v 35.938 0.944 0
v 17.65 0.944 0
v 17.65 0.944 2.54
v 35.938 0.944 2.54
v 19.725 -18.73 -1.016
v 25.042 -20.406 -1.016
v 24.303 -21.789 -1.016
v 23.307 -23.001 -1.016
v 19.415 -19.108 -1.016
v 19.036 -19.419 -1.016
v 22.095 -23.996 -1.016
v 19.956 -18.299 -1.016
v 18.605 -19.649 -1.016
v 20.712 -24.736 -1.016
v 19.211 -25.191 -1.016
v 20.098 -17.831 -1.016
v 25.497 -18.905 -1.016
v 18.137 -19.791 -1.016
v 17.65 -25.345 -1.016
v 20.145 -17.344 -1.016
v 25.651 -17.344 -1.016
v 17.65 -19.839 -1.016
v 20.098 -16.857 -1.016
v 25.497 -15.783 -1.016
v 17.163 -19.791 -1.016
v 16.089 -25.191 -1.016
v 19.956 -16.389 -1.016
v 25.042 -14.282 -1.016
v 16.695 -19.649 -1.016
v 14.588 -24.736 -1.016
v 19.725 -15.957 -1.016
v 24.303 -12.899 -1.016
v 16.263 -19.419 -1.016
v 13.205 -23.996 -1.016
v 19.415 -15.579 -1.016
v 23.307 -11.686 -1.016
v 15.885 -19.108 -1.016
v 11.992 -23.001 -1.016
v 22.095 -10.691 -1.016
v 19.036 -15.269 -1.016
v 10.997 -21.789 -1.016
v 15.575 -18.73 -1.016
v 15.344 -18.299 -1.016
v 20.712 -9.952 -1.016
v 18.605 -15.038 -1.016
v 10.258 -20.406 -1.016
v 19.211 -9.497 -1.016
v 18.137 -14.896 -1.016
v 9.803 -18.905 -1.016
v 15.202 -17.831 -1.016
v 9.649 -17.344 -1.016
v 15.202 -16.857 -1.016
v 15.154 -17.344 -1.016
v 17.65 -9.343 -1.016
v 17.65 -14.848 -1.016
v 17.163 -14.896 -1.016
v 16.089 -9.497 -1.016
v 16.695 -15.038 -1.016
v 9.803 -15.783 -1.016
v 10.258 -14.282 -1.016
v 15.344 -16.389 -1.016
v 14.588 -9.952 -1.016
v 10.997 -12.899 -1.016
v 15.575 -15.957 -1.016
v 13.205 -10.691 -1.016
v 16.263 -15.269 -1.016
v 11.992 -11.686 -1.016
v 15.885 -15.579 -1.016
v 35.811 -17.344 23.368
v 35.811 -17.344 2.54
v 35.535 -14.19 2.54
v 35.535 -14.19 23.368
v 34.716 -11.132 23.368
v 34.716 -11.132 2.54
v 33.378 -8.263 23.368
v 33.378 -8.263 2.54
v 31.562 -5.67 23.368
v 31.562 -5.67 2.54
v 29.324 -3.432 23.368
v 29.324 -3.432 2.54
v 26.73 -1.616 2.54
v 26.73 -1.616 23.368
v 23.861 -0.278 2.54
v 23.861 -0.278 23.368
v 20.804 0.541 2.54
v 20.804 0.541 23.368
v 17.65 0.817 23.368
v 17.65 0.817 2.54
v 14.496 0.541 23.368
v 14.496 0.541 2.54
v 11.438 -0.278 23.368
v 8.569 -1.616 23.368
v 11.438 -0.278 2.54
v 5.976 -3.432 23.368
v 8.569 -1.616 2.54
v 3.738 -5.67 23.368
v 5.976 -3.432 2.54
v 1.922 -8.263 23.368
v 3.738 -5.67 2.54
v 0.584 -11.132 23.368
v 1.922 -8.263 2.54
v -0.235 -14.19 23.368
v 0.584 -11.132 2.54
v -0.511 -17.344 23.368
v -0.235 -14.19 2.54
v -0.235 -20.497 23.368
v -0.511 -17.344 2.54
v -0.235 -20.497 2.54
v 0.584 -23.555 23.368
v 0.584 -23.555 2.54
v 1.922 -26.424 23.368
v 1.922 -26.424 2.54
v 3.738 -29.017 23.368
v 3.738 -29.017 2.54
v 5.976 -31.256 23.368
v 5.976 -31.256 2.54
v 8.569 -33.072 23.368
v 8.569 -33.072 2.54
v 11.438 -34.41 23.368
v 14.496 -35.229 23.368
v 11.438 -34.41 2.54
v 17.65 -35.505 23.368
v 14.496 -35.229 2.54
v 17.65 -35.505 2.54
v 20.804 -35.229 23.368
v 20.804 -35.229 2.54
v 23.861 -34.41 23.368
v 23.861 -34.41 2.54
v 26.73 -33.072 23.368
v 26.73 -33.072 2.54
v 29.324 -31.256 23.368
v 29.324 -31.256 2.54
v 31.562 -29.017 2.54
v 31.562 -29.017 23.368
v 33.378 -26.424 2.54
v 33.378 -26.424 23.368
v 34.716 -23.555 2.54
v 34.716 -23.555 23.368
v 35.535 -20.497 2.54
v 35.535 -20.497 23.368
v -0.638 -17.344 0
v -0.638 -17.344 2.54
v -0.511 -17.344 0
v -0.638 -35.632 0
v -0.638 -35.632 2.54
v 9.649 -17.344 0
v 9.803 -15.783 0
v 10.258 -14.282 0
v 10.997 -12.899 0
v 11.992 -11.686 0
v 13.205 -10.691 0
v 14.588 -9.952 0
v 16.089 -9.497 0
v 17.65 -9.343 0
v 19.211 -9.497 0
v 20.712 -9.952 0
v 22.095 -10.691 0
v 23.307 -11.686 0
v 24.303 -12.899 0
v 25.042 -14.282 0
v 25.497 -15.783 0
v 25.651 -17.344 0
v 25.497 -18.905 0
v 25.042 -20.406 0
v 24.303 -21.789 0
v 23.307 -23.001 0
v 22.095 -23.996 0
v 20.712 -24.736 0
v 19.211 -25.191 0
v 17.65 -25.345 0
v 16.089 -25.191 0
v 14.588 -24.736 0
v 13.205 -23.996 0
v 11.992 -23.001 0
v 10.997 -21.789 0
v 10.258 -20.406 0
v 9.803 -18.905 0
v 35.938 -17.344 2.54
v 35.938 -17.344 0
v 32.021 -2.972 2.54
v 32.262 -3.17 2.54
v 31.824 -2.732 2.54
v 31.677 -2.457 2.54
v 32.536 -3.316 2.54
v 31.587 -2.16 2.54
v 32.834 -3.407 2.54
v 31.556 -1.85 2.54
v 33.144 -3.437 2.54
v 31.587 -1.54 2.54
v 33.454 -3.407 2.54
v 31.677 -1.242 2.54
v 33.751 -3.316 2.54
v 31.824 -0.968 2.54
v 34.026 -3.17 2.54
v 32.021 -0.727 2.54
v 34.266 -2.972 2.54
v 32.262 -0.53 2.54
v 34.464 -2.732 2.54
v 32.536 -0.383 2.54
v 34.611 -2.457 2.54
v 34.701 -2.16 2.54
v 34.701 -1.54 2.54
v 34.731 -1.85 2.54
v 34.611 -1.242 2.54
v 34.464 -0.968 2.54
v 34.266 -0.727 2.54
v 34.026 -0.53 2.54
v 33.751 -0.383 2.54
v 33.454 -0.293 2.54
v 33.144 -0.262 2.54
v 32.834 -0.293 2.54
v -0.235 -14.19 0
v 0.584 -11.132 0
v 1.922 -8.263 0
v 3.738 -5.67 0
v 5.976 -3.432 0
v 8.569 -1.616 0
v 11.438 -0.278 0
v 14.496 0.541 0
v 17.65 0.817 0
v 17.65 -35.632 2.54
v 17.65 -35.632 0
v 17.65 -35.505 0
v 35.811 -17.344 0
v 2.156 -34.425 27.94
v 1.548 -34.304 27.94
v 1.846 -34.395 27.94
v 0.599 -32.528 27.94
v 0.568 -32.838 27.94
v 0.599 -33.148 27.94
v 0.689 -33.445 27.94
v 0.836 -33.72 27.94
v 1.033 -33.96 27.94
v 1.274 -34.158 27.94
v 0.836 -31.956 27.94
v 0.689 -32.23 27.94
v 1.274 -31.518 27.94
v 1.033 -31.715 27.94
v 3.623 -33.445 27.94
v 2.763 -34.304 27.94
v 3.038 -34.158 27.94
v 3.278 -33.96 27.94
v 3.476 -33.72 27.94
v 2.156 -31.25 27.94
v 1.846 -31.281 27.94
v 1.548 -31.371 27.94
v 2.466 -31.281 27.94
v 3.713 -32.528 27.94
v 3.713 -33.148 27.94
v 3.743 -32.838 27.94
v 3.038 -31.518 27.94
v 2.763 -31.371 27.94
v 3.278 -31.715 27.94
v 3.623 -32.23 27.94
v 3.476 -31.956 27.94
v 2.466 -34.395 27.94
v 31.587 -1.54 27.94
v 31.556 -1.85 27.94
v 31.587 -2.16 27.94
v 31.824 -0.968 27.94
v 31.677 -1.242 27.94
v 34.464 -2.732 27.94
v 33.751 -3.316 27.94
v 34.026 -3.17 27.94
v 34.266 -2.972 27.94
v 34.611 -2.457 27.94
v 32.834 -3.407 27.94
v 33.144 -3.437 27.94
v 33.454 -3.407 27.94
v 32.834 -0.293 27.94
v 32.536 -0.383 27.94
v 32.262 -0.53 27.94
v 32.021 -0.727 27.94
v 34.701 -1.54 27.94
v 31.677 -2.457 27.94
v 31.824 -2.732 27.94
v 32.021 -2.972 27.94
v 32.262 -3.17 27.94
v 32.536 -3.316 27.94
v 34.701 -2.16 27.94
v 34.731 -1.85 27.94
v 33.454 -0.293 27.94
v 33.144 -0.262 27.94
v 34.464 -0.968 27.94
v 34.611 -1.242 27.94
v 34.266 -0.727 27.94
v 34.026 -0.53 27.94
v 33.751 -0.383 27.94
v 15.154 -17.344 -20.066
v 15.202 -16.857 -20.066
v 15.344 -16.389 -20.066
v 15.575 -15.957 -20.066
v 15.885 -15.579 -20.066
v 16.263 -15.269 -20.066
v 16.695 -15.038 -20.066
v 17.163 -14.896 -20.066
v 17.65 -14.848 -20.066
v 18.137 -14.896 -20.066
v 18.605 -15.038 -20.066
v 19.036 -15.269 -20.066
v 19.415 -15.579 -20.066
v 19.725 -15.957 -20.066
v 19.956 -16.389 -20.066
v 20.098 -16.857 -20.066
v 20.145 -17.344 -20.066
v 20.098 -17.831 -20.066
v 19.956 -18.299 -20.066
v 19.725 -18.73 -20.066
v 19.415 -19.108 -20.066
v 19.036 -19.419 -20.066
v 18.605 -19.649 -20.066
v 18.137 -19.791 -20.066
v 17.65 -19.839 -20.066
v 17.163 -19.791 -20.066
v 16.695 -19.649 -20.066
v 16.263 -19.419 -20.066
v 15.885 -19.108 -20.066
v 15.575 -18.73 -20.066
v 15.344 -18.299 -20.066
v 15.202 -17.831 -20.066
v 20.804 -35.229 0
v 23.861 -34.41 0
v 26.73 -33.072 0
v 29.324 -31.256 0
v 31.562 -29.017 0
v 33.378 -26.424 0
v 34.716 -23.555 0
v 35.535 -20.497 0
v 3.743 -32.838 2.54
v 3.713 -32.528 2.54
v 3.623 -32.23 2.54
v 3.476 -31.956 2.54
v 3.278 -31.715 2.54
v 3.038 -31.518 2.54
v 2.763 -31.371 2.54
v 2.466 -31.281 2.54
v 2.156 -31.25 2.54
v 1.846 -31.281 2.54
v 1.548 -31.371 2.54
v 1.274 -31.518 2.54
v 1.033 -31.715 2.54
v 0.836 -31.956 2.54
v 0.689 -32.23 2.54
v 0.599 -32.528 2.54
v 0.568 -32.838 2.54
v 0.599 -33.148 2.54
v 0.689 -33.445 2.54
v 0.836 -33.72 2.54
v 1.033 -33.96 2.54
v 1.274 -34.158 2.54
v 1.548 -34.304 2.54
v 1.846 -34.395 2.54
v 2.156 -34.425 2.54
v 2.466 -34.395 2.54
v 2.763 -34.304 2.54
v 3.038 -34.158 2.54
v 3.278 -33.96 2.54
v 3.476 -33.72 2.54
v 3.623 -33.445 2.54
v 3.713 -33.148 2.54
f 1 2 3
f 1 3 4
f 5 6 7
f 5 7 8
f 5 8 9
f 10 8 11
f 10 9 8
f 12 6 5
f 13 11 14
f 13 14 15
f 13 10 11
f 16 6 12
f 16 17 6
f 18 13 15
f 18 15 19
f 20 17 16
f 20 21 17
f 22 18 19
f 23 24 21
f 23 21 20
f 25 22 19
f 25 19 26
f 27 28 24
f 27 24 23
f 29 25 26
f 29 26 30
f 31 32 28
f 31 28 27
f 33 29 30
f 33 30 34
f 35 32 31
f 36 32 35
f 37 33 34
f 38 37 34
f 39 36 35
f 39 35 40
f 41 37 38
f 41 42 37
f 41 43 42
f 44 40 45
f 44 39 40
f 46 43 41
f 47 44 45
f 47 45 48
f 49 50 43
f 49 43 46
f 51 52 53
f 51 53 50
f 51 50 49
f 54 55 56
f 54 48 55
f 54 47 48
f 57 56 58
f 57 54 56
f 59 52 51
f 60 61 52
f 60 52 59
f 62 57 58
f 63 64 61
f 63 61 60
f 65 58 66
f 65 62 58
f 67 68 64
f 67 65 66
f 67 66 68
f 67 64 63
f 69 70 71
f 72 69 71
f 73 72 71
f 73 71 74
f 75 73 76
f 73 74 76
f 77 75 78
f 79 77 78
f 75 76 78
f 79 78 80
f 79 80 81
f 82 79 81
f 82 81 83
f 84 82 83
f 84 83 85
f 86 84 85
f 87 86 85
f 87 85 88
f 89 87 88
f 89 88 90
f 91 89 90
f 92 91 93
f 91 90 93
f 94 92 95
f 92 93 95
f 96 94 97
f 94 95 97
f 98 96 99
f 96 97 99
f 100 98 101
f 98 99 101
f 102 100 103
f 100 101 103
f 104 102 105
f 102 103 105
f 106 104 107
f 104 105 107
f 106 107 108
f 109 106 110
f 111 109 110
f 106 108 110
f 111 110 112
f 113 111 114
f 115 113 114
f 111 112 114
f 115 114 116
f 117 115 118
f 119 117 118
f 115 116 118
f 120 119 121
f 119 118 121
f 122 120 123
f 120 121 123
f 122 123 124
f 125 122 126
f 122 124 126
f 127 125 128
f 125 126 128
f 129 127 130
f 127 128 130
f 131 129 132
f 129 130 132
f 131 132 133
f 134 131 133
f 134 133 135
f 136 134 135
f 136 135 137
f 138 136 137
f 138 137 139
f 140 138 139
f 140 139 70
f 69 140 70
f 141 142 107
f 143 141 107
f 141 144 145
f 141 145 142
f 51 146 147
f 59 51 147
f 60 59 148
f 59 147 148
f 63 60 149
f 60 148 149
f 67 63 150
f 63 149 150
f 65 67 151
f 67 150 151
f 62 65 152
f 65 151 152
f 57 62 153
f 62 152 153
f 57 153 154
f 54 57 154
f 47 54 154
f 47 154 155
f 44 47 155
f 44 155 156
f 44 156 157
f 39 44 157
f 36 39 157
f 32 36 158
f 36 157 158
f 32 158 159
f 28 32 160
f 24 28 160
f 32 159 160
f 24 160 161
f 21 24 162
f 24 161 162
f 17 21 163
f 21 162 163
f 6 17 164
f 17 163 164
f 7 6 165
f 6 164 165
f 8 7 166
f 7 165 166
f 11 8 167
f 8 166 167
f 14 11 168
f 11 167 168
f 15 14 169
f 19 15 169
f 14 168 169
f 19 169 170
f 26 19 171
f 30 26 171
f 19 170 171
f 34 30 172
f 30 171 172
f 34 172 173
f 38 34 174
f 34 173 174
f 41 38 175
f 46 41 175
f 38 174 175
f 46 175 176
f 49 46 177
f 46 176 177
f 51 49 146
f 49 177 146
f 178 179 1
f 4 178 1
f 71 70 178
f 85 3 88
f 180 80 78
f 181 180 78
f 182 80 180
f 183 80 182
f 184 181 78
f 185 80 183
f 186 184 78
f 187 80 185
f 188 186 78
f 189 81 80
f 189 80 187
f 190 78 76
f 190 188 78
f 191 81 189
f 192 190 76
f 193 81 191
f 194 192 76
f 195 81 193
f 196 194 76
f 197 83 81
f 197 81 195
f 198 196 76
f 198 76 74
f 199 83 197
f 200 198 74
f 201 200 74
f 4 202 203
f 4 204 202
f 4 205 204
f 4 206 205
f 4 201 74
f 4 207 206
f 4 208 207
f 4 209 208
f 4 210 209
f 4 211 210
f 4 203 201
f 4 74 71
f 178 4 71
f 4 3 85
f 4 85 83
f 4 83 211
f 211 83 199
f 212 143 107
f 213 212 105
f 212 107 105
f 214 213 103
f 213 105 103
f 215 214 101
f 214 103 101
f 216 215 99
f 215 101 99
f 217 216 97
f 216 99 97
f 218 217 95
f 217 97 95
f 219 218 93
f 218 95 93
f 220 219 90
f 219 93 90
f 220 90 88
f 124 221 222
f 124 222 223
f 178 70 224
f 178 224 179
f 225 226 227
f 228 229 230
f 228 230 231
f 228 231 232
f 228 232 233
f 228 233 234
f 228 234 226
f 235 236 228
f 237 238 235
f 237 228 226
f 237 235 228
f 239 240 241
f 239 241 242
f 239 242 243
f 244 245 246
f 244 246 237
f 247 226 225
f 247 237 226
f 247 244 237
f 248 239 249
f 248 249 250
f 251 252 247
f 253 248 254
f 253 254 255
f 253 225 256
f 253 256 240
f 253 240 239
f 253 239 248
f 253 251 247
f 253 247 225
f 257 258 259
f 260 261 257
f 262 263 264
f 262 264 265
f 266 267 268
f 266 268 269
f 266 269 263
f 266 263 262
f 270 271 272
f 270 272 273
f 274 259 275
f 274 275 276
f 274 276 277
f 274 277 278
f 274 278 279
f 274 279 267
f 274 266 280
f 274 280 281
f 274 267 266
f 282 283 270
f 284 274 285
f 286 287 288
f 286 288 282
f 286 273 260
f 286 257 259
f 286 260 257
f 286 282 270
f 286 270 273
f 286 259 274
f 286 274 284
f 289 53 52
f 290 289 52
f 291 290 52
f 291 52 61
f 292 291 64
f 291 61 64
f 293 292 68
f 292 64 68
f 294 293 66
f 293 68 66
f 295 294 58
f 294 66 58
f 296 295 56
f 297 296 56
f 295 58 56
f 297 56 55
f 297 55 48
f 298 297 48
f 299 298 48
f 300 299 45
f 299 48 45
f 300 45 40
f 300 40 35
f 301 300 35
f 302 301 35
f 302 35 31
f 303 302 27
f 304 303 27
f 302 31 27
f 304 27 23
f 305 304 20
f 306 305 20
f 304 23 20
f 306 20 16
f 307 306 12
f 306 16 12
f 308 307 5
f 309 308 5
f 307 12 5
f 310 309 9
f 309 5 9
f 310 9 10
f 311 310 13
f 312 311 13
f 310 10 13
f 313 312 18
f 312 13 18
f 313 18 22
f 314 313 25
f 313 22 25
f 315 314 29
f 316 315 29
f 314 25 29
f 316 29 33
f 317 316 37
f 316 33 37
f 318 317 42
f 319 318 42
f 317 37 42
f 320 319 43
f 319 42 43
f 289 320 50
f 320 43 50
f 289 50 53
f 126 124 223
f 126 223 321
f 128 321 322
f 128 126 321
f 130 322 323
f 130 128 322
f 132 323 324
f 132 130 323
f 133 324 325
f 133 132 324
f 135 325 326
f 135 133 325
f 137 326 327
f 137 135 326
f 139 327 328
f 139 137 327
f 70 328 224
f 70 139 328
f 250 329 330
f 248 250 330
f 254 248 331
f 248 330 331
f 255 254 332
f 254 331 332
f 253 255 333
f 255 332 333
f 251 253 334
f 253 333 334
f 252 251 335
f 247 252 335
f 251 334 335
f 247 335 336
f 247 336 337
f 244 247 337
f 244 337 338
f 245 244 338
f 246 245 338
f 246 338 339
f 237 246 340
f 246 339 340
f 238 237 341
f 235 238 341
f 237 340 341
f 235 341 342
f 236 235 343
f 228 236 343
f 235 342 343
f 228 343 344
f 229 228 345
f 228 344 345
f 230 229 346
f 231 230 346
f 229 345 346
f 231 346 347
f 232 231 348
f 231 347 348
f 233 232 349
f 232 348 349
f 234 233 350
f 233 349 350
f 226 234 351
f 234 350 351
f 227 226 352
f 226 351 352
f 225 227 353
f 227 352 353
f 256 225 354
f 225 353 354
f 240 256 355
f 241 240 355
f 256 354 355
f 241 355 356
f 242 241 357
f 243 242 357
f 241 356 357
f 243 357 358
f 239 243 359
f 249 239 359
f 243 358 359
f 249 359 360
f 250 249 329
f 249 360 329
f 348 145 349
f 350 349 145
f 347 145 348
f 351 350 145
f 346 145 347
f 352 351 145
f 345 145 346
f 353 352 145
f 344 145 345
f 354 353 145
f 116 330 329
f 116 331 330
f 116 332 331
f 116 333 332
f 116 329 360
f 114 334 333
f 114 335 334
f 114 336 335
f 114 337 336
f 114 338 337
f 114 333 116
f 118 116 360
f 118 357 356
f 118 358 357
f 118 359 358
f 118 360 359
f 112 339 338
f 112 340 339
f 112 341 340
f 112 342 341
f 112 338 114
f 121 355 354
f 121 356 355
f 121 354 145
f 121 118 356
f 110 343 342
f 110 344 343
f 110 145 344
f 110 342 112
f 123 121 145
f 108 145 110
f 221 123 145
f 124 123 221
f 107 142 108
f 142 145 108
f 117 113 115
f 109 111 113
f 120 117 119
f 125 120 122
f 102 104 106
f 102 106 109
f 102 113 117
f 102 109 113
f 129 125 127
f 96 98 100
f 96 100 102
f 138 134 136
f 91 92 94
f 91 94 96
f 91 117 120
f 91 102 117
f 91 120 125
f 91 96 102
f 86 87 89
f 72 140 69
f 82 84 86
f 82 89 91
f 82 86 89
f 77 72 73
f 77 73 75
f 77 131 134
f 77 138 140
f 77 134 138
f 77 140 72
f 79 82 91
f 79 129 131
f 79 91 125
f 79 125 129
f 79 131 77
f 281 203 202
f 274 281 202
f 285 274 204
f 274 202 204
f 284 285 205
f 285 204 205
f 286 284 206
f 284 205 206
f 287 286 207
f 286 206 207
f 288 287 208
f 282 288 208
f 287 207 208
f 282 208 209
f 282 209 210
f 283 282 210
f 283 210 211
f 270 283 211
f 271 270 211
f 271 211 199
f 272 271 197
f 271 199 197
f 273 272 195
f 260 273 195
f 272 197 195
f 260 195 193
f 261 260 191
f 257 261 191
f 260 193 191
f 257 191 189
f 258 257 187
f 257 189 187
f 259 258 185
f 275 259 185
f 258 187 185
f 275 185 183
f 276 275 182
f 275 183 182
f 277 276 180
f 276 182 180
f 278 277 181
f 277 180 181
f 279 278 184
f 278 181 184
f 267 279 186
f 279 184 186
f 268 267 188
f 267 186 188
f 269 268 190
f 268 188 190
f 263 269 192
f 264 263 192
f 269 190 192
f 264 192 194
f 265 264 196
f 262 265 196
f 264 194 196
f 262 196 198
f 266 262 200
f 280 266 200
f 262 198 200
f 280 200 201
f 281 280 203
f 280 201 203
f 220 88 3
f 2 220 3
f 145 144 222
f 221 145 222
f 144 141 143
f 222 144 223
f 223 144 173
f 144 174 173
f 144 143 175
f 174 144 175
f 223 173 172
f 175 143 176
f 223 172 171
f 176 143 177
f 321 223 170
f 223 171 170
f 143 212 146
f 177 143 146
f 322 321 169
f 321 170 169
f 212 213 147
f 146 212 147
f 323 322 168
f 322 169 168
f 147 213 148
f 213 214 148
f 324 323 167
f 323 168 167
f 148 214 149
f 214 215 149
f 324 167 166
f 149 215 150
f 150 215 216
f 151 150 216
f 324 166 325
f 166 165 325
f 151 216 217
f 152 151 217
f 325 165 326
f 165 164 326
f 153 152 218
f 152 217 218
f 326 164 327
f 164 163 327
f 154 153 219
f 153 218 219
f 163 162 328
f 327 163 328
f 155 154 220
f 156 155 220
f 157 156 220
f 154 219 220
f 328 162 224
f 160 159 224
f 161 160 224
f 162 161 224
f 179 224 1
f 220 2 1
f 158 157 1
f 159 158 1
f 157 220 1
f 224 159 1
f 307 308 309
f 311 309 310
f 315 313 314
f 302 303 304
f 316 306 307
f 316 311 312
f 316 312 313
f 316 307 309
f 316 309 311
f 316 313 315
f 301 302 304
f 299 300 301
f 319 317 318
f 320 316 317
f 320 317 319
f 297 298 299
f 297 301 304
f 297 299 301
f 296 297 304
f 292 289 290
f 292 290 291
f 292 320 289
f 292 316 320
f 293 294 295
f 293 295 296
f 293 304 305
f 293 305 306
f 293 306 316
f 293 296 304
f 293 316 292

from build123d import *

# Parameters (mm, degrees)
SKETCH1_W           = 36.576
SKETCH1_H           = 36.576
BOSS_EXTRUDE1_DEPTH = 2.54
SKETCH2_R           = 1.5875
BOSS_EXTRUDE2_DEPTH = 25.4
CUT_EXTRUDE4_DEPTH  = 3.54
SKETCH4_R           = 8.001
BOSS_EXTRUDE3_DEPTH = 1.016
SKETCH5_R           = 2.49555
BOSS_EXTRUDE4_DEPTH = 19.05
SKETCH6_R           = 18.161
BOSS_EXTRUDE5_DEPTH = 20.828


with BuildPart() as part:
    # Sketch1 → Boss-Extrude1 (new body)
    with BuildSketch(Plane.XY):
        with Locations((17.649916168, -17.343808383)):
            Rectangle(SKETCH1_W, SKETCH1_H)
    extrude(amount=BOSS_EXTRUDE1_DEPTH)

    # Sketch2 → Boss-Extrude2 (add)
    with BuildSketch(Plane.XY.offset(2.54)):
        with Locations((33.143916168, -1.849808383)):
            Circle(SKETCH2_R)
        with Locations((2.155916168, -32.837808383)):
            Circle(SKETCH2_R)
    extrude(amount=BOSS_EXTRUDE2_DEPTH)

    # Sketch3 → Cut-Extrude4 (cut, through all)
    with BuildSketch(Plane.XY.offset(2.54)):
        with BuildLine():
            Line((-0.638083832, 0.944191617), (-0.638083832, -17.343808383))
            Line((-0.638083832, -17.343808383), (-0.511083832, -17.343808383))
            ThreePointArc((-0.511083832, -17.343808383), (4.808149915, -4.50204213), (17.649916168, 0.817191617))
            Line((17.649916168, 0.817191617), (17.649916168, 0.944191617))
            Line((17.649916168, 0.944191617), (-0.638083832, 0.944191617))
        make_face()
        with BuildLine():
            Line((35.937916168, -35.631808383), (17.649916168, -35.631808383))
            Line((17.649916168, -35.631808383), (17.649916168, -35.504808383))
            ThreePointArc((17.649916168, -35.504808383), (30.491682421, -30.185574636), (35.810916168, -17.343808383))
            Line((35.810916168, -17.343808383), (35.937916168, -17.343808383))
            Line((35.937916168, -17.343808383), (35.937916168, -35.631808383))
        make_face()
    extrude(amount=-CUT_EXTRUDE4_DEPTH, mode=Mode.SUBTRACT)

    # Sketch4 → Boss-Extrude3 (add)
    with BuildSketch(Plane(origin=(0, 0, 0), x_dir=(-1, 0, 0), z_dir=(0, 0, -1))):
        with Locations((-17.649916168, -17.343808383)):
            Circle(SKETCH4_R)
    extrude(amount=BOSS_EXTRUDE3_DEPTH)

    # Sketch5 → Boss-Extrude4 (add)
    with BuildSketch(Plane(origin=(0, 0, -1.016), x_dir=(-1, 0, 0), z_dir=(0, 0, -1))):
        with Locations((-17.649916168, -17.343808383)):
            Circle(SKETCH5_R)
    extrude(amount=BOSS_EXTRUDE4_DEPTH)

    # Sketch6 → Boss-Extrude5 (add)
    with BuildSketch(Plane.XY.offset(2.54)):
        with Locations((17.649916168, -17.343808383)):
            Circle(SKETCH6_R)
    extrude(amount=BOSS_EXTRUDE5_DEPTH)


solid = part.part
